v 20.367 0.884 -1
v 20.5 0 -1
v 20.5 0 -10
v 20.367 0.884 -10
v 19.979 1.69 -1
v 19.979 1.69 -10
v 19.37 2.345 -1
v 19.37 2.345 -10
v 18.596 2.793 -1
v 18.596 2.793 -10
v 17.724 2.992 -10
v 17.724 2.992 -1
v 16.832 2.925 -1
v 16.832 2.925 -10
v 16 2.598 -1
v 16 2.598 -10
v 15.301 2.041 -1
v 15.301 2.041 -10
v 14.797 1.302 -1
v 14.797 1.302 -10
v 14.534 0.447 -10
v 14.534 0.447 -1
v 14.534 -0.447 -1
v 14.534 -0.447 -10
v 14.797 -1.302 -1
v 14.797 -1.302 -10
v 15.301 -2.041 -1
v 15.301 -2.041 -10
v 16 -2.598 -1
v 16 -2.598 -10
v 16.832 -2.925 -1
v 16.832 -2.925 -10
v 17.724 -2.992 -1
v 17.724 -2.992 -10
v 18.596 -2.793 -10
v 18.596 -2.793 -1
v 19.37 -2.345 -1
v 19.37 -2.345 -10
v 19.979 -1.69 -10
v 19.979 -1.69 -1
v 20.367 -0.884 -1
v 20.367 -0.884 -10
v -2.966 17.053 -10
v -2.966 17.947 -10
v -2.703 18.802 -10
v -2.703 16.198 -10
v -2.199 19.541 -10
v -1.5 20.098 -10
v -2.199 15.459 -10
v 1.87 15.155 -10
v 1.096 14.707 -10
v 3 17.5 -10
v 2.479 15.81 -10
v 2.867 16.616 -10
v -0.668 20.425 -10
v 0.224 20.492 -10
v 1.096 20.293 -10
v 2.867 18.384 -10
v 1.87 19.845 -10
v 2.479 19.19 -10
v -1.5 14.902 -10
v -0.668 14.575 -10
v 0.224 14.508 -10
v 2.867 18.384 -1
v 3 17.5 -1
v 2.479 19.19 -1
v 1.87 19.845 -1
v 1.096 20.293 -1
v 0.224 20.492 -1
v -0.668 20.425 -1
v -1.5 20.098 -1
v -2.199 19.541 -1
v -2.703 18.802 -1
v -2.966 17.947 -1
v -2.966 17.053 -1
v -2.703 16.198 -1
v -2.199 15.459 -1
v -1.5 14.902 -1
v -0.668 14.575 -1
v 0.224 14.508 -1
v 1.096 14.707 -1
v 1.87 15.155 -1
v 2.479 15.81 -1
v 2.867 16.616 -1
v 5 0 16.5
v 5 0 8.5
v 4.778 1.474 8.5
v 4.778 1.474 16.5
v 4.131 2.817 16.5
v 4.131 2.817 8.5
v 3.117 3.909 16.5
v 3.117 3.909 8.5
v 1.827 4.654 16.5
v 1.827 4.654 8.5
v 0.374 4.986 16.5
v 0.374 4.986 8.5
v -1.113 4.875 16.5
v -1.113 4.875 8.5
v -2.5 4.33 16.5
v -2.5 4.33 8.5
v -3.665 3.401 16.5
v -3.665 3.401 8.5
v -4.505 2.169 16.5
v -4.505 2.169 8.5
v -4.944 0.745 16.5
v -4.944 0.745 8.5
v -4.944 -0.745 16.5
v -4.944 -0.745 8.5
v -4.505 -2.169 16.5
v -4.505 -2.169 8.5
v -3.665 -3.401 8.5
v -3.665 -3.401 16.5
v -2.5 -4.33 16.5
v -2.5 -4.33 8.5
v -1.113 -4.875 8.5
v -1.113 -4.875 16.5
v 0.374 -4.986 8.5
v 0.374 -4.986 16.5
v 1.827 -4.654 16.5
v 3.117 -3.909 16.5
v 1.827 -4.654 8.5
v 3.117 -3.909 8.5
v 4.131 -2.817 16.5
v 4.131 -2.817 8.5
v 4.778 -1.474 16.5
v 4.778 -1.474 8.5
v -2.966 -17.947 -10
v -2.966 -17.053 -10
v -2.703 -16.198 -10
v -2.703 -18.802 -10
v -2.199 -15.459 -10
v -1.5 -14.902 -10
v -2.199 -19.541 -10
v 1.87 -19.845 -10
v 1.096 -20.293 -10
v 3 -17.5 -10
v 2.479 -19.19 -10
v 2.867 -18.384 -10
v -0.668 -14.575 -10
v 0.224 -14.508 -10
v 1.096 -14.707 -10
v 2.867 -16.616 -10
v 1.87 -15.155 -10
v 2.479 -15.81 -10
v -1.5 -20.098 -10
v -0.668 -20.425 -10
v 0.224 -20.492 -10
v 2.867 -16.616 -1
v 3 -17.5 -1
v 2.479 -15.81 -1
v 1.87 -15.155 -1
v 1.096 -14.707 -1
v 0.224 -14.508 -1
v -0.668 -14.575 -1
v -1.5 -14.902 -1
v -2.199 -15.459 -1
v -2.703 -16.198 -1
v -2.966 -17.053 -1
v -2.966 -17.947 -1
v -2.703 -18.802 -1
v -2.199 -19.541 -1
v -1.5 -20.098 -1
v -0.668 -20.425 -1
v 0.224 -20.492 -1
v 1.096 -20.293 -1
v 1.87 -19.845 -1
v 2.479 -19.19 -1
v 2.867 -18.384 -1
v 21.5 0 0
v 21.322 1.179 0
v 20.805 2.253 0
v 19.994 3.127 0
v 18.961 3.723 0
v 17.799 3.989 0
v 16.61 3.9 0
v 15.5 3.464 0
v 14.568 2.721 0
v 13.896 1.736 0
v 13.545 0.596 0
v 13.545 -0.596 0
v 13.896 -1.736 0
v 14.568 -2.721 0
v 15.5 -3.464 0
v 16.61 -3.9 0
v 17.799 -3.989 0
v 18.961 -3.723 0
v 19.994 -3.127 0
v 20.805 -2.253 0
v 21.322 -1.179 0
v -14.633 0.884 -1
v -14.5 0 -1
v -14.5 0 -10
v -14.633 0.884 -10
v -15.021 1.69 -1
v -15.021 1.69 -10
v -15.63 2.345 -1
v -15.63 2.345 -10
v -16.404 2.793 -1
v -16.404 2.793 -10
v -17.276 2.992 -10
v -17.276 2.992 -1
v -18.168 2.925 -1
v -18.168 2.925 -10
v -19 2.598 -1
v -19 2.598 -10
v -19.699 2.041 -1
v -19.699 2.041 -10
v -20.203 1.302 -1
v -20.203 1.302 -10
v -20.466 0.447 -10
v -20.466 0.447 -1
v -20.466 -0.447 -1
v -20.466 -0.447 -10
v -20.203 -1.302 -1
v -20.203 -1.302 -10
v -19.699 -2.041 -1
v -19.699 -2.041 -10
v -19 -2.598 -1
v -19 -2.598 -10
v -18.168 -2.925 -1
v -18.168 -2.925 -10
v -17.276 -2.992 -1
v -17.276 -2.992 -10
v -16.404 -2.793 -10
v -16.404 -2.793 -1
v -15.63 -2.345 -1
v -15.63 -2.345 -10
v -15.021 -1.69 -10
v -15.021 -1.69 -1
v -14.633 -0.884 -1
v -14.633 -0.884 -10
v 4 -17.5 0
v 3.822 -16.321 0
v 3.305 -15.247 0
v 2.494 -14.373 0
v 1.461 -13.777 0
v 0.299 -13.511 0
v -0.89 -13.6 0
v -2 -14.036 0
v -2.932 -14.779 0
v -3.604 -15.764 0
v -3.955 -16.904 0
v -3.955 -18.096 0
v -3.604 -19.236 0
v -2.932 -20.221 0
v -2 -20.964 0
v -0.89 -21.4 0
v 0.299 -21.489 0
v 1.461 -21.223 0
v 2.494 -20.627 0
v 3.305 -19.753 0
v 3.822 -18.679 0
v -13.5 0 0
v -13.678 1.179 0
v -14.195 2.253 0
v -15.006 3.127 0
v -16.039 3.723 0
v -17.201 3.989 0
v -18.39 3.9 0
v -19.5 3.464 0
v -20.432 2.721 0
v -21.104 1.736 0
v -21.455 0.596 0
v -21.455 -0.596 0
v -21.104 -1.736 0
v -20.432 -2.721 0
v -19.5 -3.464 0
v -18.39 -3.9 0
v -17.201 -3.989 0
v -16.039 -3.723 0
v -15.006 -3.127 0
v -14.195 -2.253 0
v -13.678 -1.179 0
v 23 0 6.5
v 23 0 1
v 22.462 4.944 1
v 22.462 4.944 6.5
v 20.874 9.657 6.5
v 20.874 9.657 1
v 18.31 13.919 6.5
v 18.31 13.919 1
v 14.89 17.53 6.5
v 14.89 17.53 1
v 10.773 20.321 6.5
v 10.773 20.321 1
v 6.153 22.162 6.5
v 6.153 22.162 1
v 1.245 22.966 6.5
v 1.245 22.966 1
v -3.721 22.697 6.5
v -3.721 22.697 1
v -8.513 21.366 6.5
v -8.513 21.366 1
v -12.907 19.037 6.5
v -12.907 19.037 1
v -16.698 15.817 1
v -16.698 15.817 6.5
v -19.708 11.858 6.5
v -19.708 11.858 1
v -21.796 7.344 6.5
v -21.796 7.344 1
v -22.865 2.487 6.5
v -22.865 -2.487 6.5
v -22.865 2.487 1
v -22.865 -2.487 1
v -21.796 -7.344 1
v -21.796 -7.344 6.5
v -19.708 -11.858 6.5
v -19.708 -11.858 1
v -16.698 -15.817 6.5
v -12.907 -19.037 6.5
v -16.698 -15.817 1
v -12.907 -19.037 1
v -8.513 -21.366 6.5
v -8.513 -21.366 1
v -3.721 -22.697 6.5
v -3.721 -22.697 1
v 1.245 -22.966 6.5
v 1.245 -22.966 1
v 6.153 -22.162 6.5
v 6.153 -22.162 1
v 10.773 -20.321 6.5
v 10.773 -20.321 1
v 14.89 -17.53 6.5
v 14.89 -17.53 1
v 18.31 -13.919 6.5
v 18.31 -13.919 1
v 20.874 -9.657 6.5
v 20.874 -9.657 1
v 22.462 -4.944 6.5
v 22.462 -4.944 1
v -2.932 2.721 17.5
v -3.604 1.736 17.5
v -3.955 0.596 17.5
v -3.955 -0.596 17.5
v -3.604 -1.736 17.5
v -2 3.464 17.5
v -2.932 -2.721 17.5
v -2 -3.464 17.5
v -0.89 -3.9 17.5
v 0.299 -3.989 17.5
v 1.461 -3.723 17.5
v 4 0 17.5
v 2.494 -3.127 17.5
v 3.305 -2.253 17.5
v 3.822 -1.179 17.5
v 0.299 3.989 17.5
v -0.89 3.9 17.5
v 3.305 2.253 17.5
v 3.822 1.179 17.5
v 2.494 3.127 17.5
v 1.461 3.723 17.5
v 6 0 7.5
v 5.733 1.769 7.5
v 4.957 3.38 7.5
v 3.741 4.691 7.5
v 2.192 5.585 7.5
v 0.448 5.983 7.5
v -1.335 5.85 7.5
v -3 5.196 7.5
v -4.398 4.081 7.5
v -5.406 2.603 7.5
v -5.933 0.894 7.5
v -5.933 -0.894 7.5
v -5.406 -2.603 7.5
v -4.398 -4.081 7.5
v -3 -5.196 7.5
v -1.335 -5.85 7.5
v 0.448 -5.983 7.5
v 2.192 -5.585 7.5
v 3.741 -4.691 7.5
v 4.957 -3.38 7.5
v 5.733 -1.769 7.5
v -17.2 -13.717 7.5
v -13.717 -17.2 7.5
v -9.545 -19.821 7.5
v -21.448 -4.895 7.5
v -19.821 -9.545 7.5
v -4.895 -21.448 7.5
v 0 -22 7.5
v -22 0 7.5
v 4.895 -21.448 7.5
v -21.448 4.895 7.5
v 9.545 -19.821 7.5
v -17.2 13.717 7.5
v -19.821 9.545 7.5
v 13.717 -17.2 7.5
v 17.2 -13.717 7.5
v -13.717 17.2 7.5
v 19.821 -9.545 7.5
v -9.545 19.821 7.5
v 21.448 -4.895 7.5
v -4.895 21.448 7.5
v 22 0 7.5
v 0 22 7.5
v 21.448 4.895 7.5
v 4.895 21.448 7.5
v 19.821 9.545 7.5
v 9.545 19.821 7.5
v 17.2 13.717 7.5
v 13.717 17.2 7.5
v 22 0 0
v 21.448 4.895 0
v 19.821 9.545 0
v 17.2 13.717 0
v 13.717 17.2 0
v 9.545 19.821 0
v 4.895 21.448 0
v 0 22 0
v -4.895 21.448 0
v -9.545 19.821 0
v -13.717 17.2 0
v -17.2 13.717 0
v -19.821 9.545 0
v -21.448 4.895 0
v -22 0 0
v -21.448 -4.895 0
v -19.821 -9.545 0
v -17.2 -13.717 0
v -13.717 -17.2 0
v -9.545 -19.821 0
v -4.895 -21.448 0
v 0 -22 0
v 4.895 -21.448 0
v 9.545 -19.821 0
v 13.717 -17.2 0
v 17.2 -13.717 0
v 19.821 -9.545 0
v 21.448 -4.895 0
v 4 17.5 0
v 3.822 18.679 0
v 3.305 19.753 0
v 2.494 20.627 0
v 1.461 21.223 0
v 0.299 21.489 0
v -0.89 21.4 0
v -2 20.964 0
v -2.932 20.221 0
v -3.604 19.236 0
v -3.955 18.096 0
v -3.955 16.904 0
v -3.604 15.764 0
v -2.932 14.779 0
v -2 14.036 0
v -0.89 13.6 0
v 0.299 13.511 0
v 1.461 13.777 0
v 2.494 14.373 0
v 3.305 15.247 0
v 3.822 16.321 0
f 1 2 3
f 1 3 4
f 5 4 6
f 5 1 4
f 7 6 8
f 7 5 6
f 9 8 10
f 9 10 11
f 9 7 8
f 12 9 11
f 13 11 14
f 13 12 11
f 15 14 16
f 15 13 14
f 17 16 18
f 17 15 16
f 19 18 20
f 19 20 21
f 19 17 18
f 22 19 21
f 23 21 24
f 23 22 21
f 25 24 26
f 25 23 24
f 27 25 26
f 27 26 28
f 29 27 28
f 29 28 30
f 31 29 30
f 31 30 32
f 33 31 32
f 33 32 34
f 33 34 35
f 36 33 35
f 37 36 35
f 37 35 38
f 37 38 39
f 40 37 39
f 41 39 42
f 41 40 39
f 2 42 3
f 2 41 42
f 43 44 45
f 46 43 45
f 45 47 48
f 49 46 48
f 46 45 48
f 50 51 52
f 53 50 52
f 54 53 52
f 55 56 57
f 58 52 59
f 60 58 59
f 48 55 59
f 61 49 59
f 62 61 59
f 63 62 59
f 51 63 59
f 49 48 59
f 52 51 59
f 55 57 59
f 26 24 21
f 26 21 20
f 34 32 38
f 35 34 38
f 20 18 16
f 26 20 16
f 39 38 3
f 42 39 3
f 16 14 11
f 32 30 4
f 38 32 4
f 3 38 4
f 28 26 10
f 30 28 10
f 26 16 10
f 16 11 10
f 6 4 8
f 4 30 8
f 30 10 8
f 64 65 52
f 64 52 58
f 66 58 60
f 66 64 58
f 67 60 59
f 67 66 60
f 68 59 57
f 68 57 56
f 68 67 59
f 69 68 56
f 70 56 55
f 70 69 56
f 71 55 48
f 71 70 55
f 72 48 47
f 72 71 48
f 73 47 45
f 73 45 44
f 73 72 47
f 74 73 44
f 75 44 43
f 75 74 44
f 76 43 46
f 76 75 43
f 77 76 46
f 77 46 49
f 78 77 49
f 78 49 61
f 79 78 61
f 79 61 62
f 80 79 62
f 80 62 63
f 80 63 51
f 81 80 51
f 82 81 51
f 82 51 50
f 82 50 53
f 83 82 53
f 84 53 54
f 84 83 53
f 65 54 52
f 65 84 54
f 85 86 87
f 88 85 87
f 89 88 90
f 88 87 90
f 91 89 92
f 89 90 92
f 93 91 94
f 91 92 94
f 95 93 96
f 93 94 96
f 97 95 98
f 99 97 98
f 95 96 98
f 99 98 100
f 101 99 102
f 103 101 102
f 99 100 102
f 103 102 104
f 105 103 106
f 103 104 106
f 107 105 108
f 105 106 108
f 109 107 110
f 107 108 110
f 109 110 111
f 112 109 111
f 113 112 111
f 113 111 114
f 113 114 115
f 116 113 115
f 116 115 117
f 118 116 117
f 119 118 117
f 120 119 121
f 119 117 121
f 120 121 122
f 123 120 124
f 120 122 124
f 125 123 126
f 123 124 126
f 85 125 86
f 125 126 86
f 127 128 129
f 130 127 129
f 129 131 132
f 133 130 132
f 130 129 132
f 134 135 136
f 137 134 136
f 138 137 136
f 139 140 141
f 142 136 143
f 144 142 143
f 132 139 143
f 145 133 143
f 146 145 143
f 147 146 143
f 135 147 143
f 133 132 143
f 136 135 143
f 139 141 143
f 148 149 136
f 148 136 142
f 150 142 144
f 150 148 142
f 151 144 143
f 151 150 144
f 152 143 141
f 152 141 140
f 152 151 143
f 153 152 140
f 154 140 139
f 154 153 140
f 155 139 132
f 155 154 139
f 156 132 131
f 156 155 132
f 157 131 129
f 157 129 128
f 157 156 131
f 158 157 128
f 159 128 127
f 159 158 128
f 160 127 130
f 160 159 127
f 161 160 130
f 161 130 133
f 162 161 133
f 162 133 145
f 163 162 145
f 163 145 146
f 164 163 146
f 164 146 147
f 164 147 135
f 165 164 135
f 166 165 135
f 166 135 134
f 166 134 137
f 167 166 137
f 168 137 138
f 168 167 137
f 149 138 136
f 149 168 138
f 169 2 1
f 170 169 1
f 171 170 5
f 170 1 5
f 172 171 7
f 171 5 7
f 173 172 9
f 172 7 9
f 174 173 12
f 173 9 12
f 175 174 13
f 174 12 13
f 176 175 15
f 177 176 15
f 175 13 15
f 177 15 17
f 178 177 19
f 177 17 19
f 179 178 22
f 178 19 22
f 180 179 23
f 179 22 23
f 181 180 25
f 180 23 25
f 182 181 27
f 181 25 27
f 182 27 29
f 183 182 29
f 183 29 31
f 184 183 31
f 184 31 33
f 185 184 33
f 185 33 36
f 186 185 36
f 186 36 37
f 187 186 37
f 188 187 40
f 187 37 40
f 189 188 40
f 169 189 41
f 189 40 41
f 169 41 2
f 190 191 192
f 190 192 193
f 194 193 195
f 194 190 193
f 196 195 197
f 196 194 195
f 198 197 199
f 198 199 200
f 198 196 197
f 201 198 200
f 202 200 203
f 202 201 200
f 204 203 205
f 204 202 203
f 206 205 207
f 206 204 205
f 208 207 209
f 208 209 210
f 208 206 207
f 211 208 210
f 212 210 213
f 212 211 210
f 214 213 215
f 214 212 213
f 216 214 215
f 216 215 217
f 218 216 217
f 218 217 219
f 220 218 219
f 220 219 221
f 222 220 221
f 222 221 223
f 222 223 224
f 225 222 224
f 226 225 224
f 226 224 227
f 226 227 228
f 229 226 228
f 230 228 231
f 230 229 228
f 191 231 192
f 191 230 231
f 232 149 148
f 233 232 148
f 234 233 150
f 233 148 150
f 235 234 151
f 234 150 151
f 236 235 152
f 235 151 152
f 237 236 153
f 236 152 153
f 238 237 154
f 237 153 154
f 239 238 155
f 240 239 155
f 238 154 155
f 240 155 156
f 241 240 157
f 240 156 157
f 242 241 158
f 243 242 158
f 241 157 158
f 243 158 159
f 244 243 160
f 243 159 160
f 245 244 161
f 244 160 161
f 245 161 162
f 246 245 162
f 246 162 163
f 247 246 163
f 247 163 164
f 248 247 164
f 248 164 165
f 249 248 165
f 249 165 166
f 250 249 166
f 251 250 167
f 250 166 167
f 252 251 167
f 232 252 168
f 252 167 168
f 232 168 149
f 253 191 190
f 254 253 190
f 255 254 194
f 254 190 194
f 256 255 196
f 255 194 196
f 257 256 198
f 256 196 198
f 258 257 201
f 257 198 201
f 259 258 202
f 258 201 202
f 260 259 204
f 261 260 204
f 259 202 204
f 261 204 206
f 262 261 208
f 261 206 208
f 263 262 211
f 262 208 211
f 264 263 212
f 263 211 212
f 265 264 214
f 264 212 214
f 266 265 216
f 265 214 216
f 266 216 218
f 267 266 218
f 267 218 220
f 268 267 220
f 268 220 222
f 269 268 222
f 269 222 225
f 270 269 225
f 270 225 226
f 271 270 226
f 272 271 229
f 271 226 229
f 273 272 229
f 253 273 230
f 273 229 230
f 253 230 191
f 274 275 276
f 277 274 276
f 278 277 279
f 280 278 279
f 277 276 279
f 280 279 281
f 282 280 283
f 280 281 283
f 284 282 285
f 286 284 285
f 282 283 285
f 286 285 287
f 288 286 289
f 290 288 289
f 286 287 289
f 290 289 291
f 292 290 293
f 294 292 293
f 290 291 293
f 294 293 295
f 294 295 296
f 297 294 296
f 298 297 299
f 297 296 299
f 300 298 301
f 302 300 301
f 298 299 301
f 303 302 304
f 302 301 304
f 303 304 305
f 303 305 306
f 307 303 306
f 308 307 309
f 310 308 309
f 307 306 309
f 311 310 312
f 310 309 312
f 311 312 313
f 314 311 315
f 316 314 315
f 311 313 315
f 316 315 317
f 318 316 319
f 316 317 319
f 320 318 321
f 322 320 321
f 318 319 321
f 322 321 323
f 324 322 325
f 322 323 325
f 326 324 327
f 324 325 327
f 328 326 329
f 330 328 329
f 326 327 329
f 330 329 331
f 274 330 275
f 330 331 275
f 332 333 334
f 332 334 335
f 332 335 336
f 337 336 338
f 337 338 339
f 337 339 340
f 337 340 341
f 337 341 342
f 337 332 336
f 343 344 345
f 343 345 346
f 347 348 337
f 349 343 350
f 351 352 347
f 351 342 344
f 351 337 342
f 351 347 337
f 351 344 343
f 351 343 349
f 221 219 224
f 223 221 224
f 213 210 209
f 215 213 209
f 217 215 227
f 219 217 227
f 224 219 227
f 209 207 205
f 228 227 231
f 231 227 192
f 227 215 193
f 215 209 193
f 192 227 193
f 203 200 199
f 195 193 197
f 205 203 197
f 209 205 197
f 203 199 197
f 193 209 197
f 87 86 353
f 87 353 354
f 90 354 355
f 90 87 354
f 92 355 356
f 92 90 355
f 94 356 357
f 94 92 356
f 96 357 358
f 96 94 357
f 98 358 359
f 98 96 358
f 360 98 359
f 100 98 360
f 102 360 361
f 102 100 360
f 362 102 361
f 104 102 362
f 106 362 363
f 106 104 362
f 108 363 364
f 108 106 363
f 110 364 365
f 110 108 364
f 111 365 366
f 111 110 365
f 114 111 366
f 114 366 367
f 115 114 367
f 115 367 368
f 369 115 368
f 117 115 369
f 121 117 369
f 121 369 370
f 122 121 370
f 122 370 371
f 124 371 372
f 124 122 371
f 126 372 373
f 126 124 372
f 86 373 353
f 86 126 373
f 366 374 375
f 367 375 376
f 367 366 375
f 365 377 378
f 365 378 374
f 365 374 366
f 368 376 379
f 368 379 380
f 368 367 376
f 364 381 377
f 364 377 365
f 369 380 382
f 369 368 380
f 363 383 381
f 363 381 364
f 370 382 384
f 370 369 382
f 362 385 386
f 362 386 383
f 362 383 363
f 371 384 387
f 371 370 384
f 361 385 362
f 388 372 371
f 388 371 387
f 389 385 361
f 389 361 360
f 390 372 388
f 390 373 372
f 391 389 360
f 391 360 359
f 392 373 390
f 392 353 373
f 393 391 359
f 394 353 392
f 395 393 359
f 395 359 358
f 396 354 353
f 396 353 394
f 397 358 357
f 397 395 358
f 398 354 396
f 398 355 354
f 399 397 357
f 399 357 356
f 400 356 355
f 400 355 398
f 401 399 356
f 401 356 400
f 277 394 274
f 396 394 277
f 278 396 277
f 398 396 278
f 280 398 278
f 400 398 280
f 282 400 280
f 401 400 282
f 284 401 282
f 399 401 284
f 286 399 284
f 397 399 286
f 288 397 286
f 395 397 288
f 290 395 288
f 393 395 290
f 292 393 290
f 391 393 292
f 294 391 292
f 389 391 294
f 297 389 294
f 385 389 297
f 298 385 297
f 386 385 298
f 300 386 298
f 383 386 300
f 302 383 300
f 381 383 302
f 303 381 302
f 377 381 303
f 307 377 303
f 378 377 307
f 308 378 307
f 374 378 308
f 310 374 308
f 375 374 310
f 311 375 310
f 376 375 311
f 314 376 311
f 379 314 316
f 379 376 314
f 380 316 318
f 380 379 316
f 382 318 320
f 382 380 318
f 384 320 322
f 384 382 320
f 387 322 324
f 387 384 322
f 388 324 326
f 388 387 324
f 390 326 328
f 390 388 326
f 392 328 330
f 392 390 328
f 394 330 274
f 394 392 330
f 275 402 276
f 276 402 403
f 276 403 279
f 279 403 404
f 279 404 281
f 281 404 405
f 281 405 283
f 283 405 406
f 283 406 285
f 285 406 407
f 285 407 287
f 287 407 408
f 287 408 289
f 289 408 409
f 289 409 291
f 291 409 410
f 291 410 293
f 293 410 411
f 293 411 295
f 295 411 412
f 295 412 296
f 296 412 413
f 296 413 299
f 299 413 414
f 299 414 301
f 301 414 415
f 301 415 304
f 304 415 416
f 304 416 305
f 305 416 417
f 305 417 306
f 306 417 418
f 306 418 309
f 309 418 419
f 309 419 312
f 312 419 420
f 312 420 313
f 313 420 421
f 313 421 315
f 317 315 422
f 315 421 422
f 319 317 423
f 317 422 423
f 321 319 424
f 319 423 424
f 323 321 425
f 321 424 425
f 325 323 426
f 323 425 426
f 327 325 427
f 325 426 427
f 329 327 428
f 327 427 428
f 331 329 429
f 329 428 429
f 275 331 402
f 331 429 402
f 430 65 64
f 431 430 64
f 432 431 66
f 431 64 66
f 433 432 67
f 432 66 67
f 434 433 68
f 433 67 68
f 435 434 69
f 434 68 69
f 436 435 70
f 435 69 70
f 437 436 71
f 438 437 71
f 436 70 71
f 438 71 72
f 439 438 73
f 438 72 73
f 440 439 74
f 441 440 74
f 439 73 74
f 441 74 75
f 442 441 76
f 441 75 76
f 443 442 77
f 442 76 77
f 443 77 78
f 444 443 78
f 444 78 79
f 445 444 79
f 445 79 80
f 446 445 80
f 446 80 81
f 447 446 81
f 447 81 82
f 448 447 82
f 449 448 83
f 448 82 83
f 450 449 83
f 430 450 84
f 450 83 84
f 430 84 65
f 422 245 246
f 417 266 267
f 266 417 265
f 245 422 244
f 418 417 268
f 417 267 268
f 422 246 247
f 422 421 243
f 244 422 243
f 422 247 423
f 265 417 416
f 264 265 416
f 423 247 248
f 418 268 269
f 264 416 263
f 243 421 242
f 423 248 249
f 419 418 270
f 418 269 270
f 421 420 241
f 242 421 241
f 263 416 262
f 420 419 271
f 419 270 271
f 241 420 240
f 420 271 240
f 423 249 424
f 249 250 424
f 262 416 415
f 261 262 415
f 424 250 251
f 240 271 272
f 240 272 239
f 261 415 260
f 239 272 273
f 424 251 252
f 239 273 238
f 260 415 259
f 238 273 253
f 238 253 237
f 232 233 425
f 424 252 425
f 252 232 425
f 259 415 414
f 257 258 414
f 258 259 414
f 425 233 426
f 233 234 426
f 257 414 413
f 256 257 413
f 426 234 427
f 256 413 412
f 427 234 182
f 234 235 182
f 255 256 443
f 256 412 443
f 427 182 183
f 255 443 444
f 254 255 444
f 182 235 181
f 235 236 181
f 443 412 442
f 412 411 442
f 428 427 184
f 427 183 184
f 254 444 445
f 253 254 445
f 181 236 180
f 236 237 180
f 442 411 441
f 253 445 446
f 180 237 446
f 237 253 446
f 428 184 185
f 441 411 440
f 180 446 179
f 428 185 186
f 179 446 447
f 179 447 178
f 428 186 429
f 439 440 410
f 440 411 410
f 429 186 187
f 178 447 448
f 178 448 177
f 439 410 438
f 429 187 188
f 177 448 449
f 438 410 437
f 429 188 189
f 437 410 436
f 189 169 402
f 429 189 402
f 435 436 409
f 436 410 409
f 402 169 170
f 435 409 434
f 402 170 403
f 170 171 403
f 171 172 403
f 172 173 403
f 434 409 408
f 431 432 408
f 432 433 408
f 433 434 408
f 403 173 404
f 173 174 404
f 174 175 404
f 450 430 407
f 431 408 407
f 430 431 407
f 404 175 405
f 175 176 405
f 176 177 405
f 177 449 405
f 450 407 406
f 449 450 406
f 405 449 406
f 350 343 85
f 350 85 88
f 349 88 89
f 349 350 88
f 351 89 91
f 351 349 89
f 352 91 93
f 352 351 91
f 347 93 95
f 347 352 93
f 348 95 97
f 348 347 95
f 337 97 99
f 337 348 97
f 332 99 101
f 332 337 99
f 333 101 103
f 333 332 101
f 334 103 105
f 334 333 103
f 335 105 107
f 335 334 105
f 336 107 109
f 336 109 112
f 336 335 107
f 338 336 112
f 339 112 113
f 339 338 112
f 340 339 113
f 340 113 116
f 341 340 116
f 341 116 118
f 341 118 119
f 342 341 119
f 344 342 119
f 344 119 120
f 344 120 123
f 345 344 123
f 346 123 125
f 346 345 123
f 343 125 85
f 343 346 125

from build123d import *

# Parameters (mm, degrees)
SKETCH1_R           = 23
BOSS_EXTRUDE1_DEPTH = 7.5
SKETCH2_R           = 3
BOSS_EXTRUDE2_DEPTH = 10
SKETCH3_R           = 5
BOSS_EXTRUDE3_DEPTH = 10
CHAMFER1_SIZE       = 1


with BuildPart() as part:
    # Sketch1 → Boss-Extrude1 (new body)
    with BuildSketch(Plane.XY):
        Circle(SKETCH1_R)
    extrude(amount=BOSS_EXTRUDE1_DEPTH)

    # Sketch2 → Boss-Extrude2 (add)
    with BuildSketch(Plane.XY):
        with Locations((0, 17.5)):
            Circle(SKETCH2_R)
        with Locations((17.5, 0)):
            Circle(SKETCH2_R)
        with Locations((0, -17.5)):
            Circle(SKETCH2_R)
        with Locations((-17.5, 0)):
            Circle(SKETCH2_R)
    extrude(amount=-BOSS_EXTRUDE2_DEPTH)

    # Sketch3 → Boss-Extrude3 (add)
    with BuildSketch(Plane.XY.offset(7.5)):
        Circle(SKETCH3_R)
    extrude(amount=BOSS_EXTRUDE3_DEPTH)

    # Chamfer1
    chamfer1_edges = [part.edges().sort_by_distance(p)[0] for p in [
        (14.5, 0, 0),
        (-3, -17.5, 0),
        (-20.5, 0, 0),
        (-23, 0, 0),
        (-5, 0, 7.5),
        (-5, 0, 17.5),
        (-23, 0, 7.5),
        (-3, 17.5, 0),
    ]]
    chamfer(chamfer1_edges, length=CHAMFER1_SIZE)


solid = part.part
